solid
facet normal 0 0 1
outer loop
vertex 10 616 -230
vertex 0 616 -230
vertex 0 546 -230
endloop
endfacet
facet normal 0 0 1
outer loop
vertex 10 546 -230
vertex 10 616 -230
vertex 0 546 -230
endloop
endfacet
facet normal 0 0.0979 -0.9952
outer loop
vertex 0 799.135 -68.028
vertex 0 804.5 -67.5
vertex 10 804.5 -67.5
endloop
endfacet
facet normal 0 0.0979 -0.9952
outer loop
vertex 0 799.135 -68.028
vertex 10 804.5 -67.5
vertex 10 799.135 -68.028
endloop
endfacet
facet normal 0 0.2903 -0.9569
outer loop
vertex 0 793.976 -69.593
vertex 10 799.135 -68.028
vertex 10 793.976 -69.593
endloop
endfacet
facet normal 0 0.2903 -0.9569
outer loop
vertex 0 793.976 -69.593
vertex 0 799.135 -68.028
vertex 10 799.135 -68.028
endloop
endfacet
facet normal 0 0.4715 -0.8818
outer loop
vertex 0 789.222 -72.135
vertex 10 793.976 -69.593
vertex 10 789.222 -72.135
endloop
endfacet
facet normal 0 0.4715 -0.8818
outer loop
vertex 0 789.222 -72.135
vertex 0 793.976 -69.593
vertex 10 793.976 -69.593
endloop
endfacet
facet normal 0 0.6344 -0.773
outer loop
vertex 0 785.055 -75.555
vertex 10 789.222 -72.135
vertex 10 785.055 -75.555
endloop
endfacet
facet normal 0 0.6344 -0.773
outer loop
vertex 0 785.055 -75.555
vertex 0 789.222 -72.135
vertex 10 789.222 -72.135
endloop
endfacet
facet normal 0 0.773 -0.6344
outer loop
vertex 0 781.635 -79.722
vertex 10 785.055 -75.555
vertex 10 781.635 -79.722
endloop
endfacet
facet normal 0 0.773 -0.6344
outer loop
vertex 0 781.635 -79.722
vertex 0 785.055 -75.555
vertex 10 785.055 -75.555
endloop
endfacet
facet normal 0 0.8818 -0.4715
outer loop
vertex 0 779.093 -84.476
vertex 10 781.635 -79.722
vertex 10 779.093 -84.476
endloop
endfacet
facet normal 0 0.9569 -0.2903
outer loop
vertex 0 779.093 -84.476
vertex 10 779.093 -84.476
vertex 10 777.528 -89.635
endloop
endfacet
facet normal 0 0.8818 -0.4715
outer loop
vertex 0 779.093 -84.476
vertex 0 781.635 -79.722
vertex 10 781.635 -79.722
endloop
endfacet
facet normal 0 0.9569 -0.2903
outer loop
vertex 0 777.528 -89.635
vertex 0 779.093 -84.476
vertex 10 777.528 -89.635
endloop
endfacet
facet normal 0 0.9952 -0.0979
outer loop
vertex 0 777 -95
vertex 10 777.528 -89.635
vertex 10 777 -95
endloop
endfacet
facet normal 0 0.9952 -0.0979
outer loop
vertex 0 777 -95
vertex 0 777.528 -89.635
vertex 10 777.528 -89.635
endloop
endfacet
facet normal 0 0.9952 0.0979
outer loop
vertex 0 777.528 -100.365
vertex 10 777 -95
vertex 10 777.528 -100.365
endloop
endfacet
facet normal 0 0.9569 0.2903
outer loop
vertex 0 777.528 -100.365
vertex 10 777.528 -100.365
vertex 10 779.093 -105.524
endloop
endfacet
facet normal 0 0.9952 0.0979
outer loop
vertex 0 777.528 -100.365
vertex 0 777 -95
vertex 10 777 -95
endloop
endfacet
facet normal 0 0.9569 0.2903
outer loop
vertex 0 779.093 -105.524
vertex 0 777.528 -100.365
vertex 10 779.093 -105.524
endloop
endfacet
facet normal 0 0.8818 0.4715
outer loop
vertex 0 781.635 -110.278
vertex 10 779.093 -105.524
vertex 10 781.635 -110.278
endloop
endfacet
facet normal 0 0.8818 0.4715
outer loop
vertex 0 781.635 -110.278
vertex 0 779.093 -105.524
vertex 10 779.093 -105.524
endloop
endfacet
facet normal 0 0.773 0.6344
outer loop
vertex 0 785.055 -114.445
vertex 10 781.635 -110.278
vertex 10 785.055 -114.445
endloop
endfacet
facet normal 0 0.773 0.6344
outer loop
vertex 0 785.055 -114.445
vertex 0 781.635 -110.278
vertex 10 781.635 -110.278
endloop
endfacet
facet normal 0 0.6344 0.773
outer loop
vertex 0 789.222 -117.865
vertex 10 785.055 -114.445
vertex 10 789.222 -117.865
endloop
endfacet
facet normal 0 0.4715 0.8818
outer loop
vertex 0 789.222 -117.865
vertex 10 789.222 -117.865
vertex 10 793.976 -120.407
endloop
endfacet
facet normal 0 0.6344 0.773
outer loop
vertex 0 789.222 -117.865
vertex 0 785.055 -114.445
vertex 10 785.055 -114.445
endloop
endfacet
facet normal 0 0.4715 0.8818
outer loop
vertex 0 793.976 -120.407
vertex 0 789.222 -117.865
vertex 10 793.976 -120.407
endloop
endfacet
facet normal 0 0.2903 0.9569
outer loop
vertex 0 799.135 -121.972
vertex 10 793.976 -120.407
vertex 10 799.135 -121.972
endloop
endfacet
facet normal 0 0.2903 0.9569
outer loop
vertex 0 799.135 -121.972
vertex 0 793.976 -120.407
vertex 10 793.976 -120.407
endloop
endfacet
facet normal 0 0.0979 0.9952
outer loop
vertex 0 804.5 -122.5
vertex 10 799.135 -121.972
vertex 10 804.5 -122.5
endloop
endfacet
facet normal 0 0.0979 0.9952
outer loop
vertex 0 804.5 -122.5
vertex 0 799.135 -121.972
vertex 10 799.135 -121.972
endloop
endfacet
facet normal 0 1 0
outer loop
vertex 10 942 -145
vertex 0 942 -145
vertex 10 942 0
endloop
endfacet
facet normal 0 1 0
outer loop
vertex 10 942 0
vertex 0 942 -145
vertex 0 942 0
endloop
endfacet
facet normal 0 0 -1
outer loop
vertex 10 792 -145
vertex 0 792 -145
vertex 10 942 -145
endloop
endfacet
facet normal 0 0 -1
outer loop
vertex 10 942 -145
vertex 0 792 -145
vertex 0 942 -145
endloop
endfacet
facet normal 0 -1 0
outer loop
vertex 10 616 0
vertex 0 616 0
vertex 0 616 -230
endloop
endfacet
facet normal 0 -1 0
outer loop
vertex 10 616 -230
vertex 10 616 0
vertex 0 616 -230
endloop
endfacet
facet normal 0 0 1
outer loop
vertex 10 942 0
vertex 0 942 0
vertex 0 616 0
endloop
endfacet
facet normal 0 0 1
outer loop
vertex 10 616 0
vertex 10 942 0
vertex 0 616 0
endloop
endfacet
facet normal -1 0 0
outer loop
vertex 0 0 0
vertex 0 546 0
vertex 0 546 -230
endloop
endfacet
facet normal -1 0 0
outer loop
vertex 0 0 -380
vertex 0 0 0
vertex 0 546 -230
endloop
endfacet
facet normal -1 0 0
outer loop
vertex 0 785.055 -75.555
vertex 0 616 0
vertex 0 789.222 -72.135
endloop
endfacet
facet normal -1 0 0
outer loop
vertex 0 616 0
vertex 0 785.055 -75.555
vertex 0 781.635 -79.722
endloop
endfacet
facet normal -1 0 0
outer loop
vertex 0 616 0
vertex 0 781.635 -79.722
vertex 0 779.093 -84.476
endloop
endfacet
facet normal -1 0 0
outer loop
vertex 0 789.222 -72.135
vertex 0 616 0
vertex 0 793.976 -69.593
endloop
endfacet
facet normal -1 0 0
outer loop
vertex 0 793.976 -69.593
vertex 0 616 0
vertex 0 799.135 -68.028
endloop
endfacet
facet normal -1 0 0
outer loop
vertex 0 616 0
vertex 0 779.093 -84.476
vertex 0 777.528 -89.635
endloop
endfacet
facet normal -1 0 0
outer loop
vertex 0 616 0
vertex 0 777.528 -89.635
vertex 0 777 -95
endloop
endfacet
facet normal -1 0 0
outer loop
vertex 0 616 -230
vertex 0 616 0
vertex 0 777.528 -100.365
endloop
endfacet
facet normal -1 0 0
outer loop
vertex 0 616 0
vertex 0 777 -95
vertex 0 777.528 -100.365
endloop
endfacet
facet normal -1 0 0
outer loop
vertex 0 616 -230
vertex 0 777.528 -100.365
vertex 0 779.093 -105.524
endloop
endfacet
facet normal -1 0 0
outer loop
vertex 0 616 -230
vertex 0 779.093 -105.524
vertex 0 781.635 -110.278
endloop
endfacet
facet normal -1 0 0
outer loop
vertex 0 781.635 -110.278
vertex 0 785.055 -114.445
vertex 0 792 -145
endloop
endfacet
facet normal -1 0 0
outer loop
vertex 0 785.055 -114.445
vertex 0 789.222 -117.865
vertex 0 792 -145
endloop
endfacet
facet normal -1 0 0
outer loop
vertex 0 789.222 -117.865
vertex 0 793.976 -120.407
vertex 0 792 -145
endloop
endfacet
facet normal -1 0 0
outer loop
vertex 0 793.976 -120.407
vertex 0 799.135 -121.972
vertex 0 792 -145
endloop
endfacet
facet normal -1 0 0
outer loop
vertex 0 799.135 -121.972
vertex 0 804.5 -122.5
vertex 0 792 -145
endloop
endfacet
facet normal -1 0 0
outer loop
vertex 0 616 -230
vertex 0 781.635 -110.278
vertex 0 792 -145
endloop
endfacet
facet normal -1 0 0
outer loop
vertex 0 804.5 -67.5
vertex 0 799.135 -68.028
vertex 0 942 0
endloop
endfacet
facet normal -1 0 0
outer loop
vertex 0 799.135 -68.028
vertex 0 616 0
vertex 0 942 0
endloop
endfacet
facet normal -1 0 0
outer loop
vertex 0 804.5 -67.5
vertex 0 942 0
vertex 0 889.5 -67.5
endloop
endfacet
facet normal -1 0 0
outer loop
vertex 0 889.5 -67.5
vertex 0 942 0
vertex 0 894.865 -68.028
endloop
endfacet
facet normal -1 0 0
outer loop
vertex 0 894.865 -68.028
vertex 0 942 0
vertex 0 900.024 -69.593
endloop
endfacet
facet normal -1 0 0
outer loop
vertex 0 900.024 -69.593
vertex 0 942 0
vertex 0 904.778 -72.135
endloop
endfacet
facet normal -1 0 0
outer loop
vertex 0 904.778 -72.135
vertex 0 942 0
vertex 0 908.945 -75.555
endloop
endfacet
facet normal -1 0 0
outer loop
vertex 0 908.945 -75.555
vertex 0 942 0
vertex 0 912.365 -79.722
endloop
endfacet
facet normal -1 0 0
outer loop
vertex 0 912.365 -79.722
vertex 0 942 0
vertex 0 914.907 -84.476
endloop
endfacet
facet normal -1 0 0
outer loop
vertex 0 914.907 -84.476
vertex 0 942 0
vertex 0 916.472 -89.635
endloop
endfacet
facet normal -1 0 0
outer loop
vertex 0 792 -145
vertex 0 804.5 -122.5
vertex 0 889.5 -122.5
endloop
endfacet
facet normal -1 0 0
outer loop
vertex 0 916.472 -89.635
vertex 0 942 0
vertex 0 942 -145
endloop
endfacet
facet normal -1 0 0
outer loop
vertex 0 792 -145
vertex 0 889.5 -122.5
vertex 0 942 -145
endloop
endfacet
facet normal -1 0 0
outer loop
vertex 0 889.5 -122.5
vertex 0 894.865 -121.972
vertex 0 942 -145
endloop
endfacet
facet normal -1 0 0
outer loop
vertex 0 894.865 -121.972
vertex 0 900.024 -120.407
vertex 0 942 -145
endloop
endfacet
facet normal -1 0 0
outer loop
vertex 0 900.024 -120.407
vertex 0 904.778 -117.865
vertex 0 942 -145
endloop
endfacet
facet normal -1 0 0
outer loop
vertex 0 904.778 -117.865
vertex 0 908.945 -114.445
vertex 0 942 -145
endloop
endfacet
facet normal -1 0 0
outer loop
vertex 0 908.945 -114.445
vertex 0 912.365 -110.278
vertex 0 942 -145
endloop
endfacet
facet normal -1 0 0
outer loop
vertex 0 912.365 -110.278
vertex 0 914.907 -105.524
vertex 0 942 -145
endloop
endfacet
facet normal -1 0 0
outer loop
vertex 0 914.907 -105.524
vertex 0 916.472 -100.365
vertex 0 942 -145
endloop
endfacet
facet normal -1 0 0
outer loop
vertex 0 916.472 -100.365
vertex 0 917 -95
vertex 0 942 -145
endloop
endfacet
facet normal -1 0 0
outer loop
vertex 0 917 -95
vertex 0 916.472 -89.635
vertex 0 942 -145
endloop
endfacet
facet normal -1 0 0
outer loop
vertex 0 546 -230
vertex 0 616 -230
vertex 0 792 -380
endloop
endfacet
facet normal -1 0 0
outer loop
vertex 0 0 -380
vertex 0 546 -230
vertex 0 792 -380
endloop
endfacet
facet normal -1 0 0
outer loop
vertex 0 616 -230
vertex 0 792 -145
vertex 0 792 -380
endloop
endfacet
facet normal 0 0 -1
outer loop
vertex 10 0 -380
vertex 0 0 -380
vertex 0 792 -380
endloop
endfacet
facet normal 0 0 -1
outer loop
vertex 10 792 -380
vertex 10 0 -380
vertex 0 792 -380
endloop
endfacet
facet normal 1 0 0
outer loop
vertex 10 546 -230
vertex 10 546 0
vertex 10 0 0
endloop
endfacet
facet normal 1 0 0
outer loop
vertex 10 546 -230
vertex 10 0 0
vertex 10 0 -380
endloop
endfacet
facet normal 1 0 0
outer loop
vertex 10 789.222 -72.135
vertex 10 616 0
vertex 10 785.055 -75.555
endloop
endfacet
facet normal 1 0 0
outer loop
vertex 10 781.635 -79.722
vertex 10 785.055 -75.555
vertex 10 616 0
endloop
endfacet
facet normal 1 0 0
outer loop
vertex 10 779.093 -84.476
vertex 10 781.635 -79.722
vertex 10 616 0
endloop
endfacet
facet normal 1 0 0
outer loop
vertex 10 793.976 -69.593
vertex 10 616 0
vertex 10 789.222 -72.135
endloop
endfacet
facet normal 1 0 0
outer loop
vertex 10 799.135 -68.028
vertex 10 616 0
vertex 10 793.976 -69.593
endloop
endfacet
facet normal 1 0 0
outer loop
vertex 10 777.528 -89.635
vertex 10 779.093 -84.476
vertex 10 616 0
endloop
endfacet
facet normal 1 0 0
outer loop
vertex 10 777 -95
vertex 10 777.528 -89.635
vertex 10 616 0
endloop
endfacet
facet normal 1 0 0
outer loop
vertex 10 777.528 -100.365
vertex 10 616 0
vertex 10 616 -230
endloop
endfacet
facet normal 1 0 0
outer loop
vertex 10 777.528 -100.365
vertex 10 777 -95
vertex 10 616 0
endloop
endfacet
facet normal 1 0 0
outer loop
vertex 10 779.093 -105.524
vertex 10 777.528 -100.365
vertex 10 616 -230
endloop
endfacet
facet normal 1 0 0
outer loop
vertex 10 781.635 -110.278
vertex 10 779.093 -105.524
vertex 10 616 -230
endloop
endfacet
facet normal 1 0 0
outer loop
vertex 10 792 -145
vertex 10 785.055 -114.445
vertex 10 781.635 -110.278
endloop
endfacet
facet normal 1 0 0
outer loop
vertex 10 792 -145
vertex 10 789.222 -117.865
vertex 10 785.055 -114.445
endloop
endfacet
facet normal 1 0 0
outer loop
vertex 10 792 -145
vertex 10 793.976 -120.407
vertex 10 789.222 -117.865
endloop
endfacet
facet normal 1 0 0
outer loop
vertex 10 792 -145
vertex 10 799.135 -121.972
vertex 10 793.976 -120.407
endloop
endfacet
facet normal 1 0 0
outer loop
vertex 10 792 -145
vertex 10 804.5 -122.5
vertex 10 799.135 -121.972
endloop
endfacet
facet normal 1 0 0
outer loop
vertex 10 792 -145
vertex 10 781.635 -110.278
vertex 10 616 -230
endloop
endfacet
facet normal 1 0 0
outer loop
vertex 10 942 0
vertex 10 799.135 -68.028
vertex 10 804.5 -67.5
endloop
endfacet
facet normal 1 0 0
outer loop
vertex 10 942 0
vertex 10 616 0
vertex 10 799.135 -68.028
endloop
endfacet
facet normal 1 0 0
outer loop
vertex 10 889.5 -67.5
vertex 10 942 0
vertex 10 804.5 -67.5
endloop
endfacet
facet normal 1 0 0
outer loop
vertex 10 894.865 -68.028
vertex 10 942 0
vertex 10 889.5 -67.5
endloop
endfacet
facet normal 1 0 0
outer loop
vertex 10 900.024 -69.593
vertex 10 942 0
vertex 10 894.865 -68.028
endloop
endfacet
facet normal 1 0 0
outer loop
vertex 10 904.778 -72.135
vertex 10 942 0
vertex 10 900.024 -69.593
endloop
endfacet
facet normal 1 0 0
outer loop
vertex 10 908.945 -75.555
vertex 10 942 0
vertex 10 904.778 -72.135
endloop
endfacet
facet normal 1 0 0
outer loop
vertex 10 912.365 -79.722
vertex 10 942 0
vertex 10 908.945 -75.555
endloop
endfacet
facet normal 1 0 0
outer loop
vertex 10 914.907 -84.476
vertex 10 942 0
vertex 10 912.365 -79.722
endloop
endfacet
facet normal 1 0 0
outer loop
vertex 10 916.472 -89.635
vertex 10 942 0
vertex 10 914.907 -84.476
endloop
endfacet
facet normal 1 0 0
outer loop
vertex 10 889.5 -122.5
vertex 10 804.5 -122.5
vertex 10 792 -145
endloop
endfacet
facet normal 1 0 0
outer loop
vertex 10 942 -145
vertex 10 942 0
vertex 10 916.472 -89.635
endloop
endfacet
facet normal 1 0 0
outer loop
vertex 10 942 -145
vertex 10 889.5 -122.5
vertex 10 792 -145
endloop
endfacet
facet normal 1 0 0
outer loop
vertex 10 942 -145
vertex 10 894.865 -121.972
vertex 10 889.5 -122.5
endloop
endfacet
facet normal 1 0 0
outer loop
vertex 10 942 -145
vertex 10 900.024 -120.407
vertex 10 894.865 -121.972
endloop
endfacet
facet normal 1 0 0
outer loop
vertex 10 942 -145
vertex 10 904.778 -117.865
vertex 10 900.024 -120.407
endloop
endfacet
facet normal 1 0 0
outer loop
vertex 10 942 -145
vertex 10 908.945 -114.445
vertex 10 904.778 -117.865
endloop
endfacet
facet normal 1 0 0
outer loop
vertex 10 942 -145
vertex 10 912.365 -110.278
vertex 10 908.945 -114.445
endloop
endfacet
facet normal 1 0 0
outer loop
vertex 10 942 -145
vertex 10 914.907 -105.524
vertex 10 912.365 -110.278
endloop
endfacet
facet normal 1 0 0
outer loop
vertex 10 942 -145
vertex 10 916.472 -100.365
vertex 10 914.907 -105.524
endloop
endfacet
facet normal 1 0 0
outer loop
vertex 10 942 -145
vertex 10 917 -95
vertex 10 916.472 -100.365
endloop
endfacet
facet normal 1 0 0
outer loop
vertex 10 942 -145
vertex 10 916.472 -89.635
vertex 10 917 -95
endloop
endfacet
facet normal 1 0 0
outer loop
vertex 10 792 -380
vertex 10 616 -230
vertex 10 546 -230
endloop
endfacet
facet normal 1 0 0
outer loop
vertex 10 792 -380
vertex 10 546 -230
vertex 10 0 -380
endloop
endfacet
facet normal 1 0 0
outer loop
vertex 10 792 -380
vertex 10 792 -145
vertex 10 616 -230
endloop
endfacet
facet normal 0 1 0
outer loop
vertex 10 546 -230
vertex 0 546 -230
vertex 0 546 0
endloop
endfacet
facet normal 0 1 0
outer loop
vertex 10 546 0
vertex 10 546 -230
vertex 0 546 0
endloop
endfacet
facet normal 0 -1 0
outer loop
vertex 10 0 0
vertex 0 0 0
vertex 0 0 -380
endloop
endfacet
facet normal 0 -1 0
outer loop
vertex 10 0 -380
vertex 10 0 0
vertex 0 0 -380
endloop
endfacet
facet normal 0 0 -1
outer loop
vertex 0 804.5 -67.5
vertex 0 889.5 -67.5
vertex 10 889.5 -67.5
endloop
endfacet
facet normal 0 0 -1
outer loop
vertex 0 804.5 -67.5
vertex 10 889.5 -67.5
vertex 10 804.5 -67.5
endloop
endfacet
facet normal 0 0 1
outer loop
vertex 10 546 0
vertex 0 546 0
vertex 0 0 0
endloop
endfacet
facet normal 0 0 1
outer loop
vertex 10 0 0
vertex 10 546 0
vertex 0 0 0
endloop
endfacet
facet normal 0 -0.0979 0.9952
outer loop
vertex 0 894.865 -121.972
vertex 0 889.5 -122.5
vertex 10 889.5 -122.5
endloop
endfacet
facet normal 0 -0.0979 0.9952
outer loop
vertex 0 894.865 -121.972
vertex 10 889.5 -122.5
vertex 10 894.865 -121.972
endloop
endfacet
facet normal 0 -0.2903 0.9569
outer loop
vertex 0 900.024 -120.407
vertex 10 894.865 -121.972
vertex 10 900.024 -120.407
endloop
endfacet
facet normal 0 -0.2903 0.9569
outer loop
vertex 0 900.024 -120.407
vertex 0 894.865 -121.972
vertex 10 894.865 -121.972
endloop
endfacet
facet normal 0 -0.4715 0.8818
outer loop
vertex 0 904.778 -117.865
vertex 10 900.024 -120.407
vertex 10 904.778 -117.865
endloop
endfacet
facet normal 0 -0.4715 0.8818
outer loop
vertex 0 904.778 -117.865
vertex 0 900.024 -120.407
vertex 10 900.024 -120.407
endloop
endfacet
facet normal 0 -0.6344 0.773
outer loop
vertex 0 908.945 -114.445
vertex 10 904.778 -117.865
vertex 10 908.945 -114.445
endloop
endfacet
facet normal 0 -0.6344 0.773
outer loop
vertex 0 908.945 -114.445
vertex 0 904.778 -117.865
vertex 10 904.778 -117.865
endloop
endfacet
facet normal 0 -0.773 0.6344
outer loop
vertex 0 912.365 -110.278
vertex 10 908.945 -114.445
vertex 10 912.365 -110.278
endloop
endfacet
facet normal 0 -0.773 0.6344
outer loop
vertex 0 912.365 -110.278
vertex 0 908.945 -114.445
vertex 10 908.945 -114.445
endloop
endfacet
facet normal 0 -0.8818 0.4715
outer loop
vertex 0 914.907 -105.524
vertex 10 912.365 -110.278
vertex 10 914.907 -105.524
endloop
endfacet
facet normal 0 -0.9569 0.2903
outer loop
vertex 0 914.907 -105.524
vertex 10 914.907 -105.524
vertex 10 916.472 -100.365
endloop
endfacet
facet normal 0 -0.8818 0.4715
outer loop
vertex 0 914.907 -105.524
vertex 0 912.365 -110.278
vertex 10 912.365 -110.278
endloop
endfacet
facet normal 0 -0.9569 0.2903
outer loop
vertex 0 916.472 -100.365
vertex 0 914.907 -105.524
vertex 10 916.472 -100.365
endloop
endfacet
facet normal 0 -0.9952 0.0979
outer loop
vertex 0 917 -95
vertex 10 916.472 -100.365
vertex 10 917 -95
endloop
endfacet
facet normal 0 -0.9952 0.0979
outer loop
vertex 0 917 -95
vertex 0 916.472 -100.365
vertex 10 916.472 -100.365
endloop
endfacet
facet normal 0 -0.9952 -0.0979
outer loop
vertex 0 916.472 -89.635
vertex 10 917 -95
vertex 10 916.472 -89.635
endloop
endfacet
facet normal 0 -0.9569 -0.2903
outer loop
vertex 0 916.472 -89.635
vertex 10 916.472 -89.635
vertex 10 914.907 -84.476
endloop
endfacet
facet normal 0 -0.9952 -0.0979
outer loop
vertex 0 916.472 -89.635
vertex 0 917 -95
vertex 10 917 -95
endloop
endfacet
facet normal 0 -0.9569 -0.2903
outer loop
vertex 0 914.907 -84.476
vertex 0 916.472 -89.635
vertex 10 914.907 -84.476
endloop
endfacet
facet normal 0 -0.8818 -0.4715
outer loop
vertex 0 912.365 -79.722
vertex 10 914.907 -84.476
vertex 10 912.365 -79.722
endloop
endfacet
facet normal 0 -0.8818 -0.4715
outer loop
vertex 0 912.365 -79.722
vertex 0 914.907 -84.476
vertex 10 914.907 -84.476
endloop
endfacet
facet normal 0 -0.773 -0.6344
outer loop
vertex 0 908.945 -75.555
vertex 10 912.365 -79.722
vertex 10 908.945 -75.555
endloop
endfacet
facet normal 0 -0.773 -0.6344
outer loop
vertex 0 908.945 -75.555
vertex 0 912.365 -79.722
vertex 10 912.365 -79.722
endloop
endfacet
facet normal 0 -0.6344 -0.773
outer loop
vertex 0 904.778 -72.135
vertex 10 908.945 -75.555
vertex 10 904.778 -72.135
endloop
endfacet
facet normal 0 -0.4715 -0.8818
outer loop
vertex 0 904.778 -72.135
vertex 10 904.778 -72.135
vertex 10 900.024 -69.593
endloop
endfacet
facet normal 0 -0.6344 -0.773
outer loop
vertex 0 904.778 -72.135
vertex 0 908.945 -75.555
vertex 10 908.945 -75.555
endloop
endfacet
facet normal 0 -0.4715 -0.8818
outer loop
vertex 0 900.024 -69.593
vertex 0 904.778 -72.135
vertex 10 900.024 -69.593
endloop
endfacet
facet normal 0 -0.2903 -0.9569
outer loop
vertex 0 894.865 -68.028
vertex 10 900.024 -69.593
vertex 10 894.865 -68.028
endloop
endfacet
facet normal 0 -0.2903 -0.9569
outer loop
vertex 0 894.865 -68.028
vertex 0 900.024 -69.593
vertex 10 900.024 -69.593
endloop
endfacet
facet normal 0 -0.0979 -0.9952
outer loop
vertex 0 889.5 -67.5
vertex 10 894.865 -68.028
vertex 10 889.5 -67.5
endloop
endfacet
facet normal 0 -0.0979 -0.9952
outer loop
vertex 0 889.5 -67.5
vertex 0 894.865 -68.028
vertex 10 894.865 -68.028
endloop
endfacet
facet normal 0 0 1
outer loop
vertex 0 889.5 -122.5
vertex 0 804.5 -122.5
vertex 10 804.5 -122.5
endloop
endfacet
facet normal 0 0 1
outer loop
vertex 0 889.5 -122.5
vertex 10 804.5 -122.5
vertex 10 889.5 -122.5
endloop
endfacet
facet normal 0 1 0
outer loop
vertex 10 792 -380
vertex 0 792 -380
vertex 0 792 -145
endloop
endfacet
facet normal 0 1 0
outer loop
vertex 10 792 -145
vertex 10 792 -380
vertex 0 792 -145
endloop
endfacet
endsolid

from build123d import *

# Parameters (mm, degrees)
BOSS_EXTRUDE1_DEPTH = 10


with BuildPart() as part:
    # Sketch1 → Boss-Extrude1 (new body)
    with BuildSketch(Plane(origin=(0, 0, 0), x_dir=(0, 0, -1), z_dir=(1, 0, 0))):
        Polygon((0, 616), (230, 616), (230, 546), (0, 546), (0, 0), (380, 0), (380, 792), (145, 792), (145, 942), (0, 942), align=None)
        with BuildLine():
            ThreePointArc((67.5, 804.5), (95, 777), (122.5, 804.5))
            Line((122.5, 804.5), (122.5, 889.5))
            ThreePointArc((122.5, 889.5), (95, 917), (67.5, 889.5))
            Line((67.5, 889.5), (67.5, 804.5))
        make_face(mode=Mode.SUBTRACT)
    extrude(amount=BOSS_EXTRUDE1_DEPTH)


solid = part.part
